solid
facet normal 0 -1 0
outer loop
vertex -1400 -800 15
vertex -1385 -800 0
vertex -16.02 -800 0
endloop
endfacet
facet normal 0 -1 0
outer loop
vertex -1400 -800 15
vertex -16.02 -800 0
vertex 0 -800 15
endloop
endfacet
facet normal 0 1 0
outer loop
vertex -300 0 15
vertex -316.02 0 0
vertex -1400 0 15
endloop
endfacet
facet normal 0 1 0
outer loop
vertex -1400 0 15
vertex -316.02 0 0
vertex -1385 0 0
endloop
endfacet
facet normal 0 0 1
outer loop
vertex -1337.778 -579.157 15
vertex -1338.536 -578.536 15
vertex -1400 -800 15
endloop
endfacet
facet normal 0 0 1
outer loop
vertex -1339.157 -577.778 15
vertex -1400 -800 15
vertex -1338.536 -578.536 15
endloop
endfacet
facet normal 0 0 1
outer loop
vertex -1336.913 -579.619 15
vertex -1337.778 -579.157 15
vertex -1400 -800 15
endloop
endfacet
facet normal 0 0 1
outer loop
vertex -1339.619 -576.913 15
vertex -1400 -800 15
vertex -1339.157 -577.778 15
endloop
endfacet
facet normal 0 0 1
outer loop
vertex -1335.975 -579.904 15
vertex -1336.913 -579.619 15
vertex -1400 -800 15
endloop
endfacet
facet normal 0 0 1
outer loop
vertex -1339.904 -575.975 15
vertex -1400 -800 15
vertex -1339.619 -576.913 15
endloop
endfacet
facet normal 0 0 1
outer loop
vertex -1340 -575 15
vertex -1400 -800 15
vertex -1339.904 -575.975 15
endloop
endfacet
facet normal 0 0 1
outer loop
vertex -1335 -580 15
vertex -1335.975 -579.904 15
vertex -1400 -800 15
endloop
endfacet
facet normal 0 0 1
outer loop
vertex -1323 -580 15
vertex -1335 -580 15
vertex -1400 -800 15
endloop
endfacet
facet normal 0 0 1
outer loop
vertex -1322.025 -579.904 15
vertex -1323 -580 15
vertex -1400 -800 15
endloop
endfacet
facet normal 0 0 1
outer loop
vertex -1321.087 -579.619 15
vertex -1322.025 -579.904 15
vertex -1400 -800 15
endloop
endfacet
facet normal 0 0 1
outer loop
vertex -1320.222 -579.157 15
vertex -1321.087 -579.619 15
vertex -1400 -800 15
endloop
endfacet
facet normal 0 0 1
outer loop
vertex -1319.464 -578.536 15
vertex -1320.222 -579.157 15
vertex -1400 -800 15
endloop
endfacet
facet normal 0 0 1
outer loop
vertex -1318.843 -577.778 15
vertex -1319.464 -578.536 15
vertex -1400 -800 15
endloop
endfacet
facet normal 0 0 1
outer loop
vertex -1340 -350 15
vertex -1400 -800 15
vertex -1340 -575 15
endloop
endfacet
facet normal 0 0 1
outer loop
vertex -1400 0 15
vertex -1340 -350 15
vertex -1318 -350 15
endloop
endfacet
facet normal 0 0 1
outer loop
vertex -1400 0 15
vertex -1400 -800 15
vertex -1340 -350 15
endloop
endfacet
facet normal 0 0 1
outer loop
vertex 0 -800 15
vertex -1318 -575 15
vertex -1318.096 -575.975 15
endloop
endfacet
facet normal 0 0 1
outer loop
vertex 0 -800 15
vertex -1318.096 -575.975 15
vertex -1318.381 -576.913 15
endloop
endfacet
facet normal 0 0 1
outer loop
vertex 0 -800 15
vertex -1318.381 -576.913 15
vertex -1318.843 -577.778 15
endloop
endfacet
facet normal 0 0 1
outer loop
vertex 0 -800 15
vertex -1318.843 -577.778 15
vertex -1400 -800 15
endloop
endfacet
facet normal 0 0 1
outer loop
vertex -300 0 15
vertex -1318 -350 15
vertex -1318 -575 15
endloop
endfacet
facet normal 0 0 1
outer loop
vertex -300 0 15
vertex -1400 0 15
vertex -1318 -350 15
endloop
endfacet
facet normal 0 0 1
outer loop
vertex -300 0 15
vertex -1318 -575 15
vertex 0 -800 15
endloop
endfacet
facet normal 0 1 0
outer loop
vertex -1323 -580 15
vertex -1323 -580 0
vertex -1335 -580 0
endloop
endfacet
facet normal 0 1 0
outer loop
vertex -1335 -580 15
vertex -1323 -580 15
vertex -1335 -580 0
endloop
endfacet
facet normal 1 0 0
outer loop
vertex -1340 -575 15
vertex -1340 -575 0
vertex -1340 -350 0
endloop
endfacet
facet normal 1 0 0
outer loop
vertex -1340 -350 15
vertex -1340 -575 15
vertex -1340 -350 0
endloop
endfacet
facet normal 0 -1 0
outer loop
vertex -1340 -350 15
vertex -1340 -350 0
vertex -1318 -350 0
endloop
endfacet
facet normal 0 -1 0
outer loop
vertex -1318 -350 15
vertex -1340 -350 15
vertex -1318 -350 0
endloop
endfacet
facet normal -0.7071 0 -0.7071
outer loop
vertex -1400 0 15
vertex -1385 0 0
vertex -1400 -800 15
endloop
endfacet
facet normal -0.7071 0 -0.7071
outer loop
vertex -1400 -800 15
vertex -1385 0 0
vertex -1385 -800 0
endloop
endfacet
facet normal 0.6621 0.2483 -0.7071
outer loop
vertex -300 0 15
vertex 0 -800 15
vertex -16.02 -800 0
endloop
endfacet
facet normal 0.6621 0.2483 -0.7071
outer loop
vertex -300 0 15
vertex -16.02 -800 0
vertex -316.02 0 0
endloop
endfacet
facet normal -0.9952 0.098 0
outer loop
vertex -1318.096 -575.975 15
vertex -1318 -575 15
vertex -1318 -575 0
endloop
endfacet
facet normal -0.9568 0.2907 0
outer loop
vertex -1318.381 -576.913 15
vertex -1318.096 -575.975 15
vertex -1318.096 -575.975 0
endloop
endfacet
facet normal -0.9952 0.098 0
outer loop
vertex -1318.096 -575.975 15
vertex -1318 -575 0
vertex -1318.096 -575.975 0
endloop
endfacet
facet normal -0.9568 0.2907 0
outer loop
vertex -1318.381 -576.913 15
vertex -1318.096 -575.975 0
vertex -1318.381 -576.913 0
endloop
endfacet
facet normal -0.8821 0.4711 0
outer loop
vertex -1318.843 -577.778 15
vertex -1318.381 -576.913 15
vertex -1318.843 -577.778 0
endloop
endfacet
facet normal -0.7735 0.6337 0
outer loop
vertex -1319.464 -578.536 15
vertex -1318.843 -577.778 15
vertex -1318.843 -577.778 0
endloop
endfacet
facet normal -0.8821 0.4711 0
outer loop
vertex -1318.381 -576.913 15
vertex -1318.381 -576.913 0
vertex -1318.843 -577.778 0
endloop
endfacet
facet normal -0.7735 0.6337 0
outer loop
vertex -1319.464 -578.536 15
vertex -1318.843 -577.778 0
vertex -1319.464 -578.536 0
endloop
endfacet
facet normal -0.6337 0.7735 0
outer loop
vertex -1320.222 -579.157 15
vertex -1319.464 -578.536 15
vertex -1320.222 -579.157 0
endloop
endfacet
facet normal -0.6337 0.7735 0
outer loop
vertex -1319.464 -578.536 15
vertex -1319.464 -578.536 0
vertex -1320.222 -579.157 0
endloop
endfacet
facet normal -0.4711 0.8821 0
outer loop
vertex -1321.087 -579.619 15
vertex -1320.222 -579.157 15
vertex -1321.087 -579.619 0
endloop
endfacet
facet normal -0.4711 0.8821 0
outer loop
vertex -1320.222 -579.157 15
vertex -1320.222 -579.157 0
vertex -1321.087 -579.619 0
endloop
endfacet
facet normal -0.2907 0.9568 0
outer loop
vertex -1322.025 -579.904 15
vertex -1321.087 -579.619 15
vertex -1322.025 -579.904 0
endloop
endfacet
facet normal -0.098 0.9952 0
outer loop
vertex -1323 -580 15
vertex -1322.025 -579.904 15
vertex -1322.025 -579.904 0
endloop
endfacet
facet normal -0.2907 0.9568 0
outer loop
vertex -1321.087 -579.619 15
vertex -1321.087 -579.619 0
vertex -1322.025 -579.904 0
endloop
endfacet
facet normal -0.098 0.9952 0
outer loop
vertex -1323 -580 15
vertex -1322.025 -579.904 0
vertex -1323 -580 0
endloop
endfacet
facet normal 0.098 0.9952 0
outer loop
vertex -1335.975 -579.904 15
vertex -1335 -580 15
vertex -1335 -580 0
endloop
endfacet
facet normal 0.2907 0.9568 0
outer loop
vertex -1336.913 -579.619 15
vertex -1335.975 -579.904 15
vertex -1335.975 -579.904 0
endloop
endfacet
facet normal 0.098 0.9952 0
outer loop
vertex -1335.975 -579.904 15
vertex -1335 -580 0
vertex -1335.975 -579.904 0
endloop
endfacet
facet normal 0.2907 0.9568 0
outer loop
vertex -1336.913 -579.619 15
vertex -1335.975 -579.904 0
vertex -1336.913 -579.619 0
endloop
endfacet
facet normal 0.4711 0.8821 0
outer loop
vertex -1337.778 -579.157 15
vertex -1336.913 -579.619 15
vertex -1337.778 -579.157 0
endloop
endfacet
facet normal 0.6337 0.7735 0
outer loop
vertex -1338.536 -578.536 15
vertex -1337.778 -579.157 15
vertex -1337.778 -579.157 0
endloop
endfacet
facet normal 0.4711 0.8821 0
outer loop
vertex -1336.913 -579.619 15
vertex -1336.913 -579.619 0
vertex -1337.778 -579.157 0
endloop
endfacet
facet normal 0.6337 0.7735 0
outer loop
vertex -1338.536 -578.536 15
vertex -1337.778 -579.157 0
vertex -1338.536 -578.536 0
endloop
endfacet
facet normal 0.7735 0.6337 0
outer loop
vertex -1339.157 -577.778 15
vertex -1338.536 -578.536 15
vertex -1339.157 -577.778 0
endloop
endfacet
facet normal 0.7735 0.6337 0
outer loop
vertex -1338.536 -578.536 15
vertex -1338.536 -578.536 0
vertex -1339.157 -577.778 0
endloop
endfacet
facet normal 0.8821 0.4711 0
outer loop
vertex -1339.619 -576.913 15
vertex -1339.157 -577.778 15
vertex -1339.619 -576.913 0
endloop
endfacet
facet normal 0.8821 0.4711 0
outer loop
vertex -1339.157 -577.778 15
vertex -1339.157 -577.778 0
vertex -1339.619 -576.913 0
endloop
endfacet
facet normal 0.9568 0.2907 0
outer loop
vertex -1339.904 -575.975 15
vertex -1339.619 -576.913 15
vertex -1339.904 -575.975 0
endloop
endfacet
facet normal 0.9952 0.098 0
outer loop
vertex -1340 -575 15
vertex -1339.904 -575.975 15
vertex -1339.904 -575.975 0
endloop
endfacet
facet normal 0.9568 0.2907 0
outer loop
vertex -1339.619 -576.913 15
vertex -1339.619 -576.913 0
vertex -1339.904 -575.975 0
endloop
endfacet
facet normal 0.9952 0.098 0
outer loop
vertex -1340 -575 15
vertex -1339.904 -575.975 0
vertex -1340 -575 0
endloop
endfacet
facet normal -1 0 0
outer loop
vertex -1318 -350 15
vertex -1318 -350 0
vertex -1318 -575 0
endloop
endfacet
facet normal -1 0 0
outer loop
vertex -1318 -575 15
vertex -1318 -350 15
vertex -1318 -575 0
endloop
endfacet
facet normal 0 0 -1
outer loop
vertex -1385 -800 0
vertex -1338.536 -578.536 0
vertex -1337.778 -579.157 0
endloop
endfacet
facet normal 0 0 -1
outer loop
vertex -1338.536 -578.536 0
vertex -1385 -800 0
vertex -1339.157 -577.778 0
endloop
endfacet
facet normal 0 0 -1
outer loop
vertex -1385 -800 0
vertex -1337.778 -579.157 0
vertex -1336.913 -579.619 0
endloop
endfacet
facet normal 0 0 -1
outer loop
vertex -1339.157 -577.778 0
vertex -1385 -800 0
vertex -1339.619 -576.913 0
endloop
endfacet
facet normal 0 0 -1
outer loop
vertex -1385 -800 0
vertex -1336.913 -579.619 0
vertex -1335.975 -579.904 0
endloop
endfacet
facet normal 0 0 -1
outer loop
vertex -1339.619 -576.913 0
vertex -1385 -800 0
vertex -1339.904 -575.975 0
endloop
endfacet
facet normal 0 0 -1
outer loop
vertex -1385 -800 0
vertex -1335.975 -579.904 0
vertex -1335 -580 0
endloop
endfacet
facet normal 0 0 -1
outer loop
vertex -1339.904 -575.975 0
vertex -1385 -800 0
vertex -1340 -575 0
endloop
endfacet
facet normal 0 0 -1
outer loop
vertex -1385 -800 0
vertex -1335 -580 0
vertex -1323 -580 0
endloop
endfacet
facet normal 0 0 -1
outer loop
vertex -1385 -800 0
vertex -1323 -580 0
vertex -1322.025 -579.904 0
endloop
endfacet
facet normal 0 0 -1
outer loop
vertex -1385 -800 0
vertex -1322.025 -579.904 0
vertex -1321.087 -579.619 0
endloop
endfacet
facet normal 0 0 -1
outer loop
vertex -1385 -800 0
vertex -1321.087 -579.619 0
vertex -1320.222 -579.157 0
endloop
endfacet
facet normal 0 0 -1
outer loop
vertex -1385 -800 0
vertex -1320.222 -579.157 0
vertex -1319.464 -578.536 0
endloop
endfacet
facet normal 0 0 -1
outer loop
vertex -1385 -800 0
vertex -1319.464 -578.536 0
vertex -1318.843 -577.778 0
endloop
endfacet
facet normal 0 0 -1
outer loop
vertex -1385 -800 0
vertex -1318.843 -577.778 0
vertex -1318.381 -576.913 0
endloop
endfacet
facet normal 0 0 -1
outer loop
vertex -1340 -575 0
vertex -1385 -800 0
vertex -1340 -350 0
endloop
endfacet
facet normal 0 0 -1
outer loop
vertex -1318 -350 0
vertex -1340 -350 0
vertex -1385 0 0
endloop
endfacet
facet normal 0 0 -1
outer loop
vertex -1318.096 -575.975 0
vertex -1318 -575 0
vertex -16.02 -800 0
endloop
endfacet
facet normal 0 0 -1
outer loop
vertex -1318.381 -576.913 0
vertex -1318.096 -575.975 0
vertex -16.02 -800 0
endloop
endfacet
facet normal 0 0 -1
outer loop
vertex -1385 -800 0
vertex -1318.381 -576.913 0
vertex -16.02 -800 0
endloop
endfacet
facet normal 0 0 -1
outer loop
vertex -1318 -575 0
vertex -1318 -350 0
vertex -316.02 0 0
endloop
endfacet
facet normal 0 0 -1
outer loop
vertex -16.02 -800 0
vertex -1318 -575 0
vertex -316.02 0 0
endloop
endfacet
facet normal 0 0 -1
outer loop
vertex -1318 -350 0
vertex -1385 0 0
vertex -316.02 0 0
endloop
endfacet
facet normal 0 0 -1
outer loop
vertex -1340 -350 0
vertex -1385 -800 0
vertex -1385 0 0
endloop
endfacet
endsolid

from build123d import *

# Parameters (mm, degrees)
F1_DEPTH = 15
F2_SIZE  = 14.99999
F3_SIZE  = 14.99999


# Not quite as in the source:
# - a fillet or chamfer is up to 0.001 mm smaller than in the source, because OpenCascade refuses the exact size


with BuildPart() as f1:
    # F0 (on Top) → F1 (new body)
    with BuildSketch(Plane.XY):
        Polygon((0, -800), (-300, 0), (-1400, 0), (-1400, -800), align=None)
        with BuildLine():
            Line((-1340, -575), (-1340, -350))
            Line((-1340, -350), (-1318, -350))
            Line((-1318, -350), (-1318, -575))
            ThreePointArc((-1318, -575), (-1319.4644660941, -578.5355339059), (-1323, -580))
            Line((-1323, -580), (-1335, -580))
            ThreePointArc((-1335, -580), (-1338.5355339059, -578.5355339059), (-1340, -575))
        make_face(mode=Mode.SUBTRACT)
    extrude(amount=F1_DEPTH)

    # F2 (size 15 in the source; OpenCascade refuses exactly that, so slightly less here)
    f2_edges = [f1.edges().sort_by_distance(p)[0] for p in [
        (-1400, -400, 0),
    ]]
    chamfer(f2_edges, length=F2_SIZE)

    # F3 (size 15 in the source; OpenCascade refuses exactly that, so slightly less here)
    f3_edges = [f1.edges().sort_by_distance(p)[0] for p in [
        (-150, -400, 0),
    ]]
    chamfer(f3_edges, length=F3_SIZE)


solid = f1.part
